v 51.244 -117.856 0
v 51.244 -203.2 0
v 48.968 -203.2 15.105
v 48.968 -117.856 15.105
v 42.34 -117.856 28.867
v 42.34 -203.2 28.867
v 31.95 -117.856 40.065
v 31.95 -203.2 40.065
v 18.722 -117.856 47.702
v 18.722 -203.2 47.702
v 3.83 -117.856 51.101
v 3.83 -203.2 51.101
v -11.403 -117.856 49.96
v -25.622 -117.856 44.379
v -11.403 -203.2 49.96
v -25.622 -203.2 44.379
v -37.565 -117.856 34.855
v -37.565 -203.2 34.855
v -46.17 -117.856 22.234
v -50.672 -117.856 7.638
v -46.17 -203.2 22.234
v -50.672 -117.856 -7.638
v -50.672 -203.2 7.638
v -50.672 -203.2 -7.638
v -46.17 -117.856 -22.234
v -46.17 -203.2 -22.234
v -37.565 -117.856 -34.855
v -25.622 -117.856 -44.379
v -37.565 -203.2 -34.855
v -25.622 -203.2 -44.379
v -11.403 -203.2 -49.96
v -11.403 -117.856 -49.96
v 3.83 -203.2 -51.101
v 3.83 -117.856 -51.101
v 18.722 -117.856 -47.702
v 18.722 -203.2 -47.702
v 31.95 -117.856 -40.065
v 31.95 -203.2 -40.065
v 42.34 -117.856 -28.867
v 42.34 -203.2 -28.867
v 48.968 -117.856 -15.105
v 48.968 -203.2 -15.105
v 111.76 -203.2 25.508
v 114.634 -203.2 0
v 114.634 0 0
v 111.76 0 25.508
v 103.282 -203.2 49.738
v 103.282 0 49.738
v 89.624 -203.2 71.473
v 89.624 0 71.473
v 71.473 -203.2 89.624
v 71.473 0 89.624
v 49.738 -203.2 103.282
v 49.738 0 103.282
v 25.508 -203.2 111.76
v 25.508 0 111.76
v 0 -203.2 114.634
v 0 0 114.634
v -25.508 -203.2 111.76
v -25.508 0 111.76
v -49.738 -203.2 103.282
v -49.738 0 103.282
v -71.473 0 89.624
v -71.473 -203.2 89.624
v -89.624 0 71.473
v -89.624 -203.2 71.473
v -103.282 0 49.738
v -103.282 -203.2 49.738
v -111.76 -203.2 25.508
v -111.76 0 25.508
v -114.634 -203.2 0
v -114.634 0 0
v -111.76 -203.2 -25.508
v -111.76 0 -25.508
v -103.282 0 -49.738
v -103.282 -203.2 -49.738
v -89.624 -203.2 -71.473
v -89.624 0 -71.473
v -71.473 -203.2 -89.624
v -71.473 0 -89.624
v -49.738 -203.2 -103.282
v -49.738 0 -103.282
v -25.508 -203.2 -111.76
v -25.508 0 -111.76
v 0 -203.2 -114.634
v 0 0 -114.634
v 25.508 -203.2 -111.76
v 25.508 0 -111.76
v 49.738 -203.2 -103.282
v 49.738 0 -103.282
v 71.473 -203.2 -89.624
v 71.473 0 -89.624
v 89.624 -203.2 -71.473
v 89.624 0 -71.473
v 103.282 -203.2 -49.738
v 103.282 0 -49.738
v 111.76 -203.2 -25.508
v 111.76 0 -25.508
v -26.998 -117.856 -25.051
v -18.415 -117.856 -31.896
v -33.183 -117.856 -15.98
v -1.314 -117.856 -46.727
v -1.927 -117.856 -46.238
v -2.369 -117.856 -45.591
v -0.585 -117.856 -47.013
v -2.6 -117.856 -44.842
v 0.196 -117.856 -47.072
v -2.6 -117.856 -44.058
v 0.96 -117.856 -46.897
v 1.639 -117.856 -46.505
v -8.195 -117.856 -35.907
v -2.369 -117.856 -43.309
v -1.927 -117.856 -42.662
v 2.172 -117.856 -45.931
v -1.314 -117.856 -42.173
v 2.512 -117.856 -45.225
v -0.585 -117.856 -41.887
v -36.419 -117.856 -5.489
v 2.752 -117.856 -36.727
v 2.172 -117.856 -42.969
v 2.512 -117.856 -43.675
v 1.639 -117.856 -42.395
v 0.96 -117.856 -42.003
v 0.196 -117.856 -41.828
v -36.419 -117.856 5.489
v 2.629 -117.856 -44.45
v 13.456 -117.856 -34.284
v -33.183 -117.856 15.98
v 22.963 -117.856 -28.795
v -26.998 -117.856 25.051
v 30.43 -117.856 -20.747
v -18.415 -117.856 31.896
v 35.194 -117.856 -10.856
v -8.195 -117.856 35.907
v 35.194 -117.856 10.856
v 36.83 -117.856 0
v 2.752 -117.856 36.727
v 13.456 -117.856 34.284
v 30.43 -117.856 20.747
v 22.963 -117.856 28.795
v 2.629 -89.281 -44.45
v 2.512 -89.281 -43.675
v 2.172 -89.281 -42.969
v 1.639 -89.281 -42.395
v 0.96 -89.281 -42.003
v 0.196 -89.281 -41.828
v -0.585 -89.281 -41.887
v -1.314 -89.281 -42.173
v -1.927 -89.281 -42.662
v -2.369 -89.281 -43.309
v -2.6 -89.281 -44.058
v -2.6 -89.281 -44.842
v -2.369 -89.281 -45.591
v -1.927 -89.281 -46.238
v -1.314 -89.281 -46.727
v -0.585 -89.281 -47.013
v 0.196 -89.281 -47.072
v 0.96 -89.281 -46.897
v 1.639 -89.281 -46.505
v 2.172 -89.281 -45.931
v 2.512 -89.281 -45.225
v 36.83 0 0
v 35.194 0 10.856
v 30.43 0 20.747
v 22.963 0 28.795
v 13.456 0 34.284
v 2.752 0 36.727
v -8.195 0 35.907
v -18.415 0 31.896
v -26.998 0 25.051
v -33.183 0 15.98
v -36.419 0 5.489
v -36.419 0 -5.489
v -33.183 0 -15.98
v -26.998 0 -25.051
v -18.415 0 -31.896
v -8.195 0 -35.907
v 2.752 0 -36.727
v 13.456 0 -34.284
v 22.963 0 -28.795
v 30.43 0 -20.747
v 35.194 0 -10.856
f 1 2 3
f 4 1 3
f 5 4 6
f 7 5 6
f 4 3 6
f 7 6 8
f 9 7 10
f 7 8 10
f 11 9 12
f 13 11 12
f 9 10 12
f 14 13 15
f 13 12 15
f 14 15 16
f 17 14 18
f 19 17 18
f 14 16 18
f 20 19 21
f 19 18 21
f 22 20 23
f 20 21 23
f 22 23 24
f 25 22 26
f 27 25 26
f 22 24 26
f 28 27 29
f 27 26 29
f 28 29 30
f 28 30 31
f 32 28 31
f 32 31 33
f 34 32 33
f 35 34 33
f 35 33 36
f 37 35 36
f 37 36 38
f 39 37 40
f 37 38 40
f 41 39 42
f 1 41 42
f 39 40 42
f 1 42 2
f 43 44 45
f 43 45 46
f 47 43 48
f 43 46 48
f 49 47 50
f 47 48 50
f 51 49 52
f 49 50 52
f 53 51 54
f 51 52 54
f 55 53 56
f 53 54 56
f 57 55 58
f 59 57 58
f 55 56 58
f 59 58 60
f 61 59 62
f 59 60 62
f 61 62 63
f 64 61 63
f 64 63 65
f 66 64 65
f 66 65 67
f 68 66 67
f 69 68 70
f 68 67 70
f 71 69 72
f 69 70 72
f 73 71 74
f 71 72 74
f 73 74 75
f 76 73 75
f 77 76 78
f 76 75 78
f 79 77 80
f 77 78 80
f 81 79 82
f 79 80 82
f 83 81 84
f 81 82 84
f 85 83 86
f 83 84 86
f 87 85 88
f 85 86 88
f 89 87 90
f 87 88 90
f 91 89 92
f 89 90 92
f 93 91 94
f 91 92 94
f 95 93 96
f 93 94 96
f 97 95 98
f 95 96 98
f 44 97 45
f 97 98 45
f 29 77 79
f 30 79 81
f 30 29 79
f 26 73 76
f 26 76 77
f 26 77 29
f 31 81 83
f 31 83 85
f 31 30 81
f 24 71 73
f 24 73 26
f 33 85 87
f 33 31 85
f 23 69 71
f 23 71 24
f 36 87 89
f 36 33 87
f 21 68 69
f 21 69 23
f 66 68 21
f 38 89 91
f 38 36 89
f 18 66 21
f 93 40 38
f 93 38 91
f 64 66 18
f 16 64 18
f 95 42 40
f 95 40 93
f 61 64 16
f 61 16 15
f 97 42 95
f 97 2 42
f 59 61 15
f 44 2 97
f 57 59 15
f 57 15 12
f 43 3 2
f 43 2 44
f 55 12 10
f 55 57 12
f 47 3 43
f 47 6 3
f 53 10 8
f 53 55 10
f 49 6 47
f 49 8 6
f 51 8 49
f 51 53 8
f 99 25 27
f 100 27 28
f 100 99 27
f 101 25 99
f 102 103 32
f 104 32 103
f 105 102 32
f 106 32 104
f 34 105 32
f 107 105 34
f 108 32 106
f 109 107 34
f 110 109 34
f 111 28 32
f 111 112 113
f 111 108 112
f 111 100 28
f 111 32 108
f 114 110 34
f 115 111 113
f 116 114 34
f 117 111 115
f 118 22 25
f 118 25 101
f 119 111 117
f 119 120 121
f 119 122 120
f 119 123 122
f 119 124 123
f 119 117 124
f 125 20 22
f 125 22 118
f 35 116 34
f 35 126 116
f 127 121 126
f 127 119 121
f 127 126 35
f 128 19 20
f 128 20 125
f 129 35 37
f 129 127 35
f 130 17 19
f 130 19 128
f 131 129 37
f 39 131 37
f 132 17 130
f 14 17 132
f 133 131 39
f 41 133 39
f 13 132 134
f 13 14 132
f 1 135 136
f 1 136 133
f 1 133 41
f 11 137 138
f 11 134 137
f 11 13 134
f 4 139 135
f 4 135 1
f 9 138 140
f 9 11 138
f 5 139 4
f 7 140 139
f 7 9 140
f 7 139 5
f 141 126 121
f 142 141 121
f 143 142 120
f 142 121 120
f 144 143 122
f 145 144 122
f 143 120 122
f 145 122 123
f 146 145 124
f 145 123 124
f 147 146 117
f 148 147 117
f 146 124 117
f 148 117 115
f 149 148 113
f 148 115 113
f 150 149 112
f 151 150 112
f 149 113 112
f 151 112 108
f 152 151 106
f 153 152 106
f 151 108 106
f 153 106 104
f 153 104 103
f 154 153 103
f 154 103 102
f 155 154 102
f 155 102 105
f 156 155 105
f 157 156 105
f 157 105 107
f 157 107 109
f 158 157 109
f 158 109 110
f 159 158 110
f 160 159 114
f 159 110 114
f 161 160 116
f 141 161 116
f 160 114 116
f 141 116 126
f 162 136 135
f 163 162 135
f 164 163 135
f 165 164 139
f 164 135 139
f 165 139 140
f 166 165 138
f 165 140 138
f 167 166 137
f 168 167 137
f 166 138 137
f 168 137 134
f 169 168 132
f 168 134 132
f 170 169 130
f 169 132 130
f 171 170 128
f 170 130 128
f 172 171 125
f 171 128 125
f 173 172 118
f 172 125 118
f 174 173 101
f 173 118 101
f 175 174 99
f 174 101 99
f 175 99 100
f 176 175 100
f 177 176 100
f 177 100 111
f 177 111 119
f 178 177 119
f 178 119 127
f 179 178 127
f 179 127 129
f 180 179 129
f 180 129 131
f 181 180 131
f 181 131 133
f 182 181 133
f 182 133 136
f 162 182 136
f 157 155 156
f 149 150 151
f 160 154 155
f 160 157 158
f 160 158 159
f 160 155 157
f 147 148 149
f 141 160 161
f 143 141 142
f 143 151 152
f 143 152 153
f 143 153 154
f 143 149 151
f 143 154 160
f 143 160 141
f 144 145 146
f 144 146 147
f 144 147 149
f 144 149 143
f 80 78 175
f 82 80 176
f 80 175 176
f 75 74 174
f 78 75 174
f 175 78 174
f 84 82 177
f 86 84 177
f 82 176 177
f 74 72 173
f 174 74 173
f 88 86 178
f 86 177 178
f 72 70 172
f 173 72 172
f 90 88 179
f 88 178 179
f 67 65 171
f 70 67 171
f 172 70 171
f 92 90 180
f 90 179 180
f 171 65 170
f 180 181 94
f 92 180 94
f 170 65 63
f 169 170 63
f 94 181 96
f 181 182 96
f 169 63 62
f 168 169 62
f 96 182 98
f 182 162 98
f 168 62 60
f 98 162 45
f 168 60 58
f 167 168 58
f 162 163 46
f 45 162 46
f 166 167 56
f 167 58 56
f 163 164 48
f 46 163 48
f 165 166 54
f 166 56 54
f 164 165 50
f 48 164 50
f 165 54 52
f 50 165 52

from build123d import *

# Parameters (mm, degrees)
F0_R     = 114.633929
F1_DEPTH = 203.2
F2_R     = 36.83
F3_DEPTH = 355.6
F4_R     = 51.2445
F5_DEPTH = 85.344
F6_R     = 2.6289
F7_DEPTH = 28.575


with BuildPart() as f1:
    # F0 (on Front) → F1 (new body)
    with BuildSketch(Plane.XZ):
        Circle(F0_R)
    extrude(amount=F1_DEPTH)

    # F2 (on face) → F3 (cut)
    with BuildSketch(Plane.XZ.offset(203.2)):
        Circle(F2_R)
    extrude(amount=-F3_DEPTH, mode=Mode.SUBTRACT)

    # F4 (on face) → F5 (cut)
    with BuildSketch(Plane.XZ.offset(203.2)):
        Circle(F4_R)
    extrude(amount=-F5_DEPTH, mode=Mode.SUBTRACT)

    # F6 (on face) → F7 (cut)
    with BuildSketch(Plane.XZ.offset(117.856)):
        with Locations((0, -44.45)):
            Circle(F6_R)
    extrude(amount=-F7_DEPTH, mode=Mode.SUBTRACT)


solid = f1.part
